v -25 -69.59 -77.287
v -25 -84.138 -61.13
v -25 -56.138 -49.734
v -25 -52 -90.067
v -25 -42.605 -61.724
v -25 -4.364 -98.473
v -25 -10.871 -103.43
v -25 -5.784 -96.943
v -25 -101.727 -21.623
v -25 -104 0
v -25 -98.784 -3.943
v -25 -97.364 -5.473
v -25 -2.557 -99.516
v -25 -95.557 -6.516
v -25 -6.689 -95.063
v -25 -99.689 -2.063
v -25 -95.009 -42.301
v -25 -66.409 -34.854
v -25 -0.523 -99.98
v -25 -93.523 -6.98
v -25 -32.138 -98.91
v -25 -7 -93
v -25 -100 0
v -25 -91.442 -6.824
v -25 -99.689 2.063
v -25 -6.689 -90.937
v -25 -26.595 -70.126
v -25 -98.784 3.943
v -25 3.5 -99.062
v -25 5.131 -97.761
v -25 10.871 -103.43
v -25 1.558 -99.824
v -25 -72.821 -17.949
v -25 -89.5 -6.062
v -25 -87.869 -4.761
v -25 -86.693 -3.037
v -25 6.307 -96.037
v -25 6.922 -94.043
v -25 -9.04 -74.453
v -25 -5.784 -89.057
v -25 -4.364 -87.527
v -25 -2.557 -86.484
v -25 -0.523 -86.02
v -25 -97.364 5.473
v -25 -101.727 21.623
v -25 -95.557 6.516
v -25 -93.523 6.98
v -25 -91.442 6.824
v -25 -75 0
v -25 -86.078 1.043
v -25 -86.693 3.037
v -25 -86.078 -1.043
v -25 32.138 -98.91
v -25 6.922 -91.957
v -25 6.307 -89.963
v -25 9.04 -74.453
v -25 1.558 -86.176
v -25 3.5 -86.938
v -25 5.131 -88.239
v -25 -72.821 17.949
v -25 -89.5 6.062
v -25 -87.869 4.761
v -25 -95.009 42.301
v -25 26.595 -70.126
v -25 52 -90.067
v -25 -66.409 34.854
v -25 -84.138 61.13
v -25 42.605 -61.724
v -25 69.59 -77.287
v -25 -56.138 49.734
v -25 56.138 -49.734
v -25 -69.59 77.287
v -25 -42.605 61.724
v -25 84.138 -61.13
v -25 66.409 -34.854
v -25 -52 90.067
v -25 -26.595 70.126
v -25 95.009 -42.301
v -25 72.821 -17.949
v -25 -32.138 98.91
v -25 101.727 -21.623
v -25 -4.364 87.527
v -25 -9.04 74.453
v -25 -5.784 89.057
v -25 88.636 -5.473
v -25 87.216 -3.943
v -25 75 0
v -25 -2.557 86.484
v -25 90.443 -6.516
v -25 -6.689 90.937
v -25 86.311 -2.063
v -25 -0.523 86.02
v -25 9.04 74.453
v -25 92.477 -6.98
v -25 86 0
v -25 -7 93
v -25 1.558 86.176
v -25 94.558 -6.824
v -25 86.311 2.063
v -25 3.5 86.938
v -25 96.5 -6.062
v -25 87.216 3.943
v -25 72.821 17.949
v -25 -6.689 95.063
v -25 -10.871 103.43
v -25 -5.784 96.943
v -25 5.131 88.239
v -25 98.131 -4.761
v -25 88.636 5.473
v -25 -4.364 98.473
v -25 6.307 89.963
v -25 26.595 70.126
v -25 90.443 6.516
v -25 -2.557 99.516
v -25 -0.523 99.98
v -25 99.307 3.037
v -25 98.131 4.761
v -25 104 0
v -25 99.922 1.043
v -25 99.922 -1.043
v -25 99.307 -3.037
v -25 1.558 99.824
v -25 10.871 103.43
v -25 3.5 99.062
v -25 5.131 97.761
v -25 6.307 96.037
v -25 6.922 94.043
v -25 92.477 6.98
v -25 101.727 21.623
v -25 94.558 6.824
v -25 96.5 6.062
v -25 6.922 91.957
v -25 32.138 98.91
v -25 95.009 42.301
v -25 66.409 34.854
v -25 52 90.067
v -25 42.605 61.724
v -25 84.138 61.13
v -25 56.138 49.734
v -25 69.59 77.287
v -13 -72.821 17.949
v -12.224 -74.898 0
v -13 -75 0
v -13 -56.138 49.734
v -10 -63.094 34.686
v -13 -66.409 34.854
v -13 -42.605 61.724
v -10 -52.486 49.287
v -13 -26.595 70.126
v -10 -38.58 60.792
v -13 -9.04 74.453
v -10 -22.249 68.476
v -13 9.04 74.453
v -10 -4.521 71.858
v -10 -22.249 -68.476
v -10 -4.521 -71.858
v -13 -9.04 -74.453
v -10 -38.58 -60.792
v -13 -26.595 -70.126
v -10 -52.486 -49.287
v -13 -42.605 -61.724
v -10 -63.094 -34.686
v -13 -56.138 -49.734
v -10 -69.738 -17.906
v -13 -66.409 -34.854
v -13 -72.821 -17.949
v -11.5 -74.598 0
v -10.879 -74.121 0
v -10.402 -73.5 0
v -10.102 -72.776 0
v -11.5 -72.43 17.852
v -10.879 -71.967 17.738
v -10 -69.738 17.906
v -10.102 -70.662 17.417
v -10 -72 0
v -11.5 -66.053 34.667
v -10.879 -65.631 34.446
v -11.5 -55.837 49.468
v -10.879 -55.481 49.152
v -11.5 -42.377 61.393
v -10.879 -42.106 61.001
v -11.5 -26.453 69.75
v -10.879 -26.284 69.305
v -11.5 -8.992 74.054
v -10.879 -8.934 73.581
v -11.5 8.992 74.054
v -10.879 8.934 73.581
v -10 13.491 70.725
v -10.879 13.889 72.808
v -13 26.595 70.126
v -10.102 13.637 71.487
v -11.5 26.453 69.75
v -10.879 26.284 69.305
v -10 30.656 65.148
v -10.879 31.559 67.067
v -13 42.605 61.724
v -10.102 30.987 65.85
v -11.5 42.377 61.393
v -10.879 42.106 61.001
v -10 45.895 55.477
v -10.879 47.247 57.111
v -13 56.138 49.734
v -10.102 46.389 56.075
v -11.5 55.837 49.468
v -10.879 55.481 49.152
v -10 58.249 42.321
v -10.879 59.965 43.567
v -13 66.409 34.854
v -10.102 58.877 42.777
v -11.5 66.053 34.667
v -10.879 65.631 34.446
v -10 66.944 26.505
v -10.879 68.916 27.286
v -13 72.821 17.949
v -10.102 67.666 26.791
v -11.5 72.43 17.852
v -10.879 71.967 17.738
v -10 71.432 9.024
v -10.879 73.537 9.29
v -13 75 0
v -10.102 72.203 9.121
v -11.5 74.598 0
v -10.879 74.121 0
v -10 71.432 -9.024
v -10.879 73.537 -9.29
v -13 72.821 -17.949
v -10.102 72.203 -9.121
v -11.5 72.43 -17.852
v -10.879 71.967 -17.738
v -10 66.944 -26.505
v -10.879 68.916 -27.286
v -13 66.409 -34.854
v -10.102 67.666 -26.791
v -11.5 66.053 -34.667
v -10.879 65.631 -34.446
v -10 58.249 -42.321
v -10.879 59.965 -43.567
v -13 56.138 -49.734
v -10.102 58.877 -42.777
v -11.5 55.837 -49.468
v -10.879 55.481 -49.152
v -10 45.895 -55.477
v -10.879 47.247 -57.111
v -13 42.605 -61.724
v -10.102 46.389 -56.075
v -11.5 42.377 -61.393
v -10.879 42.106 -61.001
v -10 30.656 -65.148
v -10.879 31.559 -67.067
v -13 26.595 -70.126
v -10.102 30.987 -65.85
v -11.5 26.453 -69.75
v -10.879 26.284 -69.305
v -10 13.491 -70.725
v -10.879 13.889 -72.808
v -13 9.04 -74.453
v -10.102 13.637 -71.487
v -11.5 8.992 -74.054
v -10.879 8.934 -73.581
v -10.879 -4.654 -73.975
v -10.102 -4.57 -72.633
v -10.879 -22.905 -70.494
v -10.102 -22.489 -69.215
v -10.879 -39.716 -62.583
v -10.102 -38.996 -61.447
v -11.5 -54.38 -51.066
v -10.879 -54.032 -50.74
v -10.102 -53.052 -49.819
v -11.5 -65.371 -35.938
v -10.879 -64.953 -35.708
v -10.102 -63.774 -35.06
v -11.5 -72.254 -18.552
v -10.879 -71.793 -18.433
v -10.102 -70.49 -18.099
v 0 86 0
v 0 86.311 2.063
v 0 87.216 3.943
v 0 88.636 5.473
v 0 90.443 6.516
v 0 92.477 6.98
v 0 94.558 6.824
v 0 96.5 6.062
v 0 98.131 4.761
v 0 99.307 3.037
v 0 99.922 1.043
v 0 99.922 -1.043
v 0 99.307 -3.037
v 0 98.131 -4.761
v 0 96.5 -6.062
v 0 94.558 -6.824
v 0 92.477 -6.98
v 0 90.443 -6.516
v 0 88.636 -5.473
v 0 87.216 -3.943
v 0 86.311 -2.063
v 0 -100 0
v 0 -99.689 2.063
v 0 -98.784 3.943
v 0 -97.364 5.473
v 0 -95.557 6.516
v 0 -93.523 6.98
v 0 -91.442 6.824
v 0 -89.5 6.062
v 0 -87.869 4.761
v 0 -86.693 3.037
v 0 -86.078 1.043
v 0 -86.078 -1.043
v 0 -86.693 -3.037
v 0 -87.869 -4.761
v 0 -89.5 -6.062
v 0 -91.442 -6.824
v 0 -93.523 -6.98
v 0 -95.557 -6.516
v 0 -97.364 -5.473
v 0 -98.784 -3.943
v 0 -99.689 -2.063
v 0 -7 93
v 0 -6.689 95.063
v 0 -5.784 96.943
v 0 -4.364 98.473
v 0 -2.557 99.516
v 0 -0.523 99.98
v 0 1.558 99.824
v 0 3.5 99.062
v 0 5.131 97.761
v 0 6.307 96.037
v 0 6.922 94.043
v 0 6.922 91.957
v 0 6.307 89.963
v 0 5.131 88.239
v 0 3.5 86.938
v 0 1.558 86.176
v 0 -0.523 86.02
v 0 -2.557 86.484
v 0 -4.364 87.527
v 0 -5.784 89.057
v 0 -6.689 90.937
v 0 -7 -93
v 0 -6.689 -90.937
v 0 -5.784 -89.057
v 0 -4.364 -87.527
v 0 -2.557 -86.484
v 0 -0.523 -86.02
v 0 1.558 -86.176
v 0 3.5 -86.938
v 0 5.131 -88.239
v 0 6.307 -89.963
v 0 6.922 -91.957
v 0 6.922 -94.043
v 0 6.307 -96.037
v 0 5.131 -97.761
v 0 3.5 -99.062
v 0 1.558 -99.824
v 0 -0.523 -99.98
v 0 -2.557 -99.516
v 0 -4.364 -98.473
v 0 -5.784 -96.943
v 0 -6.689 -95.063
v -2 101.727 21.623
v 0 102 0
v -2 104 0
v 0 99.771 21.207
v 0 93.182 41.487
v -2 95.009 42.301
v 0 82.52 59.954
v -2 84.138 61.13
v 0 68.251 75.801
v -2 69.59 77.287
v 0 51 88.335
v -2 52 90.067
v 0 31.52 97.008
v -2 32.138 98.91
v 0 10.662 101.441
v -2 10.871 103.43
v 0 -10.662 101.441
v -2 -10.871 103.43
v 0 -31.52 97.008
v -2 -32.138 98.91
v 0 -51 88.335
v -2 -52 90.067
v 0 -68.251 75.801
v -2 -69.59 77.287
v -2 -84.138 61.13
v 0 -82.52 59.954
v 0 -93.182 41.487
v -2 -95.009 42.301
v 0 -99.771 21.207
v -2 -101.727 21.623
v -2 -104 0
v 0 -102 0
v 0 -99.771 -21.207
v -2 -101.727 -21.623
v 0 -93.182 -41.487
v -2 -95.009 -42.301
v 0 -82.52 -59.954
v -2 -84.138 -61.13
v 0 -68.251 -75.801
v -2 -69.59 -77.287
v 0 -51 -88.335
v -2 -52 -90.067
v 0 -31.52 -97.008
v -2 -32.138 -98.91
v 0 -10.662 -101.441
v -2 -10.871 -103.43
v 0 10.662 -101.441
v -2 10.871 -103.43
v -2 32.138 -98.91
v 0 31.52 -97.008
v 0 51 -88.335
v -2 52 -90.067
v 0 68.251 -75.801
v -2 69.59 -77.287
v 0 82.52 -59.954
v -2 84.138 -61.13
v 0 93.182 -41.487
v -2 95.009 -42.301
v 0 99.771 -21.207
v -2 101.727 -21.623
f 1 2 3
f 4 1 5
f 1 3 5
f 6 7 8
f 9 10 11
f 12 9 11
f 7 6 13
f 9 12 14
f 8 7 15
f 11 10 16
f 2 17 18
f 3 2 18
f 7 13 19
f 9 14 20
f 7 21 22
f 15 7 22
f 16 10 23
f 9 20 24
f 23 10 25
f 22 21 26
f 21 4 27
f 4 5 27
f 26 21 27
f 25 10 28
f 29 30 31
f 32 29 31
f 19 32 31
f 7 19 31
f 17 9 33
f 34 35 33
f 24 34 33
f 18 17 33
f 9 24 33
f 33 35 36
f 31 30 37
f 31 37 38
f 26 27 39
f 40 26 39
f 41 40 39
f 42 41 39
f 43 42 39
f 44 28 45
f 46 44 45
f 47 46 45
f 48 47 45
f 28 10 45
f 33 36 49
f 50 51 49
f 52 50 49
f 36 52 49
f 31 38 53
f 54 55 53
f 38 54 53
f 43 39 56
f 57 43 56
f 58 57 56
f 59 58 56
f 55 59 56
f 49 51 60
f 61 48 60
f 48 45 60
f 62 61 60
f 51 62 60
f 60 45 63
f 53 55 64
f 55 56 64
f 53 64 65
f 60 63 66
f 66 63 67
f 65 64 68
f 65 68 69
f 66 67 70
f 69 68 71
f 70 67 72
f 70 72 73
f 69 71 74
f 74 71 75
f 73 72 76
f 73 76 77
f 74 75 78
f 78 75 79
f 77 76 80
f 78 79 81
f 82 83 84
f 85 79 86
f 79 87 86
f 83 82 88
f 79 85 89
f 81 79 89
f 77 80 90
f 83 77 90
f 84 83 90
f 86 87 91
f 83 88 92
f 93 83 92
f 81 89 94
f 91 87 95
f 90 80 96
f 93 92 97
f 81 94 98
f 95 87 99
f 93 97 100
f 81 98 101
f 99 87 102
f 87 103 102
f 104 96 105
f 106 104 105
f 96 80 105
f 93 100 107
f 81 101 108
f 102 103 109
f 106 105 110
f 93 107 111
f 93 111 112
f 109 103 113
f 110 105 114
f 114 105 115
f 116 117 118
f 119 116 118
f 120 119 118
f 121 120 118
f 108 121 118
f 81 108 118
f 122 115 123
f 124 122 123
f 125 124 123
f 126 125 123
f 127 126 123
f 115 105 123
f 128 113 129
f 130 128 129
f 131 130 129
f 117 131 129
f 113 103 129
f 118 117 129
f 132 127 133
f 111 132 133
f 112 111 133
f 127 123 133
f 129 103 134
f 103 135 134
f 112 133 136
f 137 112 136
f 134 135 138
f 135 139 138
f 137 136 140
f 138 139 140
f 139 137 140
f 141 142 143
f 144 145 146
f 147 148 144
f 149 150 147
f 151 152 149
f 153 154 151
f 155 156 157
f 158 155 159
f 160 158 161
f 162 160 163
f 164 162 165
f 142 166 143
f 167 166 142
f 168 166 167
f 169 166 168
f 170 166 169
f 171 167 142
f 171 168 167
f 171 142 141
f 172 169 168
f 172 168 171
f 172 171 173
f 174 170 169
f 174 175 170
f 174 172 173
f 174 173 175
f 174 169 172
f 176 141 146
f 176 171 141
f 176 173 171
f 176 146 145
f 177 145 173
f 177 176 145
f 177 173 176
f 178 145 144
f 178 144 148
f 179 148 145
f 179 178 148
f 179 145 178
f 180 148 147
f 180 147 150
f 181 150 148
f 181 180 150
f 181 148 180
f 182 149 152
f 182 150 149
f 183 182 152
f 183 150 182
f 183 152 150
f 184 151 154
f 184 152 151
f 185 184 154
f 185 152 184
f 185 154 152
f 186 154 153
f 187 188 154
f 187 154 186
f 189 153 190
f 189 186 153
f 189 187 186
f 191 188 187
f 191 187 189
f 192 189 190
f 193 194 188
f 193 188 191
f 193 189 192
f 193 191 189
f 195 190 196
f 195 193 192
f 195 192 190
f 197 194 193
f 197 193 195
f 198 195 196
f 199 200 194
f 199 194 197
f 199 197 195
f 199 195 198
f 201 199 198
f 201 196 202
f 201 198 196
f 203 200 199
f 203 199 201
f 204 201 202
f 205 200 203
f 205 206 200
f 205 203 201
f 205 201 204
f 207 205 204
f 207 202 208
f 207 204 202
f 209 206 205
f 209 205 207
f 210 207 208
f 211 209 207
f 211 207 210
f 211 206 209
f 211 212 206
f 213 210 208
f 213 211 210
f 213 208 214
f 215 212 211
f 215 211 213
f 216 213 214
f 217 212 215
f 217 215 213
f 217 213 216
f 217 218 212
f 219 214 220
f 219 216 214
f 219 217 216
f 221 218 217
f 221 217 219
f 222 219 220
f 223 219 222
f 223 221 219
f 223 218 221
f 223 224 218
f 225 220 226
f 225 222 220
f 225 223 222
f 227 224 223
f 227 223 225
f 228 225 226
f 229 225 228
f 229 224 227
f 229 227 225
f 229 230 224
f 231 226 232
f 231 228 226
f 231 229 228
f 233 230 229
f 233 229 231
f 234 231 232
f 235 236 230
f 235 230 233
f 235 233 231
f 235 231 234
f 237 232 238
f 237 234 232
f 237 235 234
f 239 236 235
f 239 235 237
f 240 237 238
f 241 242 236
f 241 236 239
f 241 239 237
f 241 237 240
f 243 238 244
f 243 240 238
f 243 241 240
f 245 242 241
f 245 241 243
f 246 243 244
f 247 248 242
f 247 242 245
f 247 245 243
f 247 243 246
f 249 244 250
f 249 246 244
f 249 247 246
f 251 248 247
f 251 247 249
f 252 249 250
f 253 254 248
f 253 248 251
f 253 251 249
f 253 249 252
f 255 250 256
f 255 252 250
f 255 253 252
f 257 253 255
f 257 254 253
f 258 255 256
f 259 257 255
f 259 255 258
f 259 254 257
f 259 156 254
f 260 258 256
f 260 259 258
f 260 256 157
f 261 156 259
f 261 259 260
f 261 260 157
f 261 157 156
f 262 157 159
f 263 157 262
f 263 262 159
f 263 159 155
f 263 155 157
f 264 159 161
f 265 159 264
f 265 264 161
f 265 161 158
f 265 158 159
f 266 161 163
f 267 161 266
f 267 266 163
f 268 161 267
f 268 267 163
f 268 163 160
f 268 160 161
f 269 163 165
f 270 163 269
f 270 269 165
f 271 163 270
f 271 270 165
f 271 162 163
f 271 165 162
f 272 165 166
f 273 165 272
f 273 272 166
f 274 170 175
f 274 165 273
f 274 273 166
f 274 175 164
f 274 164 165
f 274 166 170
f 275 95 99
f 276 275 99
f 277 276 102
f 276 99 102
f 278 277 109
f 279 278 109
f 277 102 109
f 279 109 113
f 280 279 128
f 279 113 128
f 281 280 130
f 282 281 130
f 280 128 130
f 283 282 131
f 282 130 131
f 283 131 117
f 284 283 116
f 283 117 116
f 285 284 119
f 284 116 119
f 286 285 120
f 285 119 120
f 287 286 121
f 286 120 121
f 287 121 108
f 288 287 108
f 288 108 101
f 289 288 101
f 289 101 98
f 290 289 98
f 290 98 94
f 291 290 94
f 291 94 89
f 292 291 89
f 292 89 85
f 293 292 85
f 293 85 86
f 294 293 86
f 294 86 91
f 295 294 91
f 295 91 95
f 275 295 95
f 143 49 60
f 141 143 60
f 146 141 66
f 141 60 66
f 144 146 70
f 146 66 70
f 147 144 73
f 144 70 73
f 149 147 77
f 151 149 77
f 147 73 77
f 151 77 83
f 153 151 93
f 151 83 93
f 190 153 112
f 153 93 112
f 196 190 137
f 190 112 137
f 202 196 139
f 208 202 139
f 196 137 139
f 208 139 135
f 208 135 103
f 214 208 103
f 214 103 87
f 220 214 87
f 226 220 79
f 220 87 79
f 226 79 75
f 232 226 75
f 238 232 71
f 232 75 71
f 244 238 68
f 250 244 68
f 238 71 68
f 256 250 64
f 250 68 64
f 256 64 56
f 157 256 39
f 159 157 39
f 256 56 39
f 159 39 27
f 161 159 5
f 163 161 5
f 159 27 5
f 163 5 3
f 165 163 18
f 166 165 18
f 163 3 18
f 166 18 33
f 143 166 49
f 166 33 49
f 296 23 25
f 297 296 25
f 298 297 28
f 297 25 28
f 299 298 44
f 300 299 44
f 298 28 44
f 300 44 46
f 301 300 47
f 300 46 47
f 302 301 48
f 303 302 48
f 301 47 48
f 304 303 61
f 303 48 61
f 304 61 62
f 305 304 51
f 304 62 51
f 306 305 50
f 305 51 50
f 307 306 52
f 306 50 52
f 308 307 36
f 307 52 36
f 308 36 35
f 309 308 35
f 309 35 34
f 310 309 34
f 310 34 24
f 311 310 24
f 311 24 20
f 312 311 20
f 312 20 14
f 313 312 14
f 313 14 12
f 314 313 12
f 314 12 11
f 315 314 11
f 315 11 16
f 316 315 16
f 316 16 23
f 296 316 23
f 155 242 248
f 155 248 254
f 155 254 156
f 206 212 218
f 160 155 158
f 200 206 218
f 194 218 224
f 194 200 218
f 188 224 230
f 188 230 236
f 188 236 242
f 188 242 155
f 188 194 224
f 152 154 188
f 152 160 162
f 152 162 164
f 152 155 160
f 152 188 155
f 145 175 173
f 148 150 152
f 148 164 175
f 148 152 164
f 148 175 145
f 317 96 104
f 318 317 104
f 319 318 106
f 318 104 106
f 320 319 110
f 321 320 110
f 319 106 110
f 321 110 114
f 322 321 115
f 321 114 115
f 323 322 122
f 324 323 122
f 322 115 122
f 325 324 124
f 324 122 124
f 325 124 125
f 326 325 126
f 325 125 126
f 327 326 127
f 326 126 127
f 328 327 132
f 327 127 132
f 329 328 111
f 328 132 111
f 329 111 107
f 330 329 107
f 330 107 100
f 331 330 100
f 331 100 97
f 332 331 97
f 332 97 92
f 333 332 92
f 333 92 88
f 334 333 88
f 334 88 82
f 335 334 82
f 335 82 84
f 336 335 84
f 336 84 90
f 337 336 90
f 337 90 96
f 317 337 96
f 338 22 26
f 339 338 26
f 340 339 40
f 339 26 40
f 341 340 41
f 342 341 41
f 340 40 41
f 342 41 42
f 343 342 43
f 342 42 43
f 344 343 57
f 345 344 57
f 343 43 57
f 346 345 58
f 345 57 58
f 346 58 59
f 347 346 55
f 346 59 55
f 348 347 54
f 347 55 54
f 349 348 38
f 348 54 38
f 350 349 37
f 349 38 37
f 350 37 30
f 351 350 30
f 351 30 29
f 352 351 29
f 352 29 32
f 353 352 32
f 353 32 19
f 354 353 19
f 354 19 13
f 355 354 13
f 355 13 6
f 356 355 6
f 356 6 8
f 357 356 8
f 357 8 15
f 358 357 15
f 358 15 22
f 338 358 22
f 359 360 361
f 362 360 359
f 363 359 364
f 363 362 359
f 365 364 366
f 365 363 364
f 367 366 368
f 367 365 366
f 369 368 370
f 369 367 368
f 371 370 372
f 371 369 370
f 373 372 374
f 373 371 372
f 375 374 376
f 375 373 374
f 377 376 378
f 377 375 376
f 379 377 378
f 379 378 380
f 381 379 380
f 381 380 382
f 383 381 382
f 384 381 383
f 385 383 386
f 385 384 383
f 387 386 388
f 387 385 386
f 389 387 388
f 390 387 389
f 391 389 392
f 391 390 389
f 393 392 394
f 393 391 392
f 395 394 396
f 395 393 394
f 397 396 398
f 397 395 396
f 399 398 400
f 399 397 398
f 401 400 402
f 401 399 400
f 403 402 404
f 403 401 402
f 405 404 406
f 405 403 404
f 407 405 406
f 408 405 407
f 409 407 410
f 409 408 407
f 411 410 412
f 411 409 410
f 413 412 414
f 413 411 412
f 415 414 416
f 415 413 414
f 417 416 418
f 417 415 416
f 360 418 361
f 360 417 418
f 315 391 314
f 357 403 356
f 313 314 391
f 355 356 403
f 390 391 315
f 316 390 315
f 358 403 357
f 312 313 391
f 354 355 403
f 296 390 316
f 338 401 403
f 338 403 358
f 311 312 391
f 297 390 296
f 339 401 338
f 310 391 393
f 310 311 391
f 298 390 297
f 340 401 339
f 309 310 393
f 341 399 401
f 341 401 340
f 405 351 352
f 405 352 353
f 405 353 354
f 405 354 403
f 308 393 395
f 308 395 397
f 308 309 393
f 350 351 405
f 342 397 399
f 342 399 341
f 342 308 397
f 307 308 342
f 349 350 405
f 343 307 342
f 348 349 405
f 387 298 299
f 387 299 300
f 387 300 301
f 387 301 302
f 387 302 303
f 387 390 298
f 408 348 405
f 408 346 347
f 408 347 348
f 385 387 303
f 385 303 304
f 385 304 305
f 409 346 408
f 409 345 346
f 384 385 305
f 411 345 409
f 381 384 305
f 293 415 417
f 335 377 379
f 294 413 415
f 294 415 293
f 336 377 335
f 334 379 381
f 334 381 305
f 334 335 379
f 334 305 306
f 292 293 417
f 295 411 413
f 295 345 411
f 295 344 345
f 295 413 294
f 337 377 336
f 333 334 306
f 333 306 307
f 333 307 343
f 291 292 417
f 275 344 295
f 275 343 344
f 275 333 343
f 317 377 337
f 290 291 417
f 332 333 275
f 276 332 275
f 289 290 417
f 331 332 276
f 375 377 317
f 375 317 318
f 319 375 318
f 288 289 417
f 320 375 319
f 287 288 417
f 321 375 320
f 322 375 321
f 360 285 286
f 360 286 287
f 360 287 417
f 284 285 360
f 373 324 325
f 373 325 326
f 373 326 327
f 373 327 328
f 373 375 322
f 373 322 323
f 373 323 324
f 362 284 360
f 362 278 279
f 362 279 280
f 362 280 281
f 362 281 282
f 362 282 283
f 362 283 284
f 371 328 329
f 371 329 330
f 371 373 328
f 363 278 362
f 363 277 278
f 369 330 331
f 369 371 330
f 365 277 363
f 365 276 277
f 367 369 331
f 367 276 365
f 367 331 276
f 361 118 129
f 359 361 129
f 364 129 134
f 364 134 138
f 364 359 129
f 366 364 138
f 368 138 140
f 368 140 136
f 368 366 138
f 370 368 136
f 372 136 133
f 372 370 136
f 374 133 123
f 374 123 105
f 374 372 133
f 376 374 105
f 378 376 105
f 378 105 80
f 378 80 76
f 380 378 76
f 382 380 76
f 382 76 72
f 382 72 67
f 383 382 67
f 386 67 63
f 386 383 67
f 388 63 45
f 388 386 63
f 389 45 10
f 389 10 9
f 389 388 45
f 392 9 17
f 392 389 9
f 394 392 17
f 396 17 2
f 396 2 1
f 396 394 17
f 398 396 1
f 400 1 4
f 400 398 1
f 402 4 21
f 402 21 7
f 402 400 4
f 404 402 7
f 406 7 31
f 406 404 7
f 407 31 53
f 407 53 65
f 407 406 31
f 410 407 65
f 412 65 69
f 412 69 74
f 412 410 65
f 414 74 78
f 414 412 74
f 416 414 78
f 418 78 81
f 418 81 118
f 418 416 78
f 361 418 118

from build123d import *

# Parameters (mm, degrees)
F0_R     = 104
F1_DEPTH = 25
F2_R     = 75
F3_DEPTH = 15
F4_R     = 3
F5_SIZE  = 2
F7_D     = 14


with BuildPart() as f1:
    # F0 (on Right) → F1 (new body)
    with BuildSketch(Plane.YZ):
        Circle(F0_R)
    extrude(amount=-F1_DEPTH)

    # F2 (on face) → F3 (cut)
    with BuildSketch(Plane(origin=(-25, 0, 0), x_dir=(0, -1, 0), z_dir=(-1, 0, 0))):
        Circle(F2_R)
    extrude(amount=-F3_DEPTH, mode=Mode.SUBTRACT)

    # F4
    f4_edges = [f1.edges().sort_by_distance(p)[0] for p in [
        (-10, 75, 0),
    ]]
    fillet(f4_edges, radius=F4_R)

    # F5
    f5_edges = [f1.edges().sort_by_distance(p)[0] for p in [
        (0, -104, 0),
    ]]
    chamfer(f5_edges, length=F5_SIZE)

    # F7 (through all)
    with Locations(Plane.YZ):
        with Locations((0, 93), (93, 0), (0, -93), (-93, 0)):
            Hole(F7_D / 2)


solid = f1.part
